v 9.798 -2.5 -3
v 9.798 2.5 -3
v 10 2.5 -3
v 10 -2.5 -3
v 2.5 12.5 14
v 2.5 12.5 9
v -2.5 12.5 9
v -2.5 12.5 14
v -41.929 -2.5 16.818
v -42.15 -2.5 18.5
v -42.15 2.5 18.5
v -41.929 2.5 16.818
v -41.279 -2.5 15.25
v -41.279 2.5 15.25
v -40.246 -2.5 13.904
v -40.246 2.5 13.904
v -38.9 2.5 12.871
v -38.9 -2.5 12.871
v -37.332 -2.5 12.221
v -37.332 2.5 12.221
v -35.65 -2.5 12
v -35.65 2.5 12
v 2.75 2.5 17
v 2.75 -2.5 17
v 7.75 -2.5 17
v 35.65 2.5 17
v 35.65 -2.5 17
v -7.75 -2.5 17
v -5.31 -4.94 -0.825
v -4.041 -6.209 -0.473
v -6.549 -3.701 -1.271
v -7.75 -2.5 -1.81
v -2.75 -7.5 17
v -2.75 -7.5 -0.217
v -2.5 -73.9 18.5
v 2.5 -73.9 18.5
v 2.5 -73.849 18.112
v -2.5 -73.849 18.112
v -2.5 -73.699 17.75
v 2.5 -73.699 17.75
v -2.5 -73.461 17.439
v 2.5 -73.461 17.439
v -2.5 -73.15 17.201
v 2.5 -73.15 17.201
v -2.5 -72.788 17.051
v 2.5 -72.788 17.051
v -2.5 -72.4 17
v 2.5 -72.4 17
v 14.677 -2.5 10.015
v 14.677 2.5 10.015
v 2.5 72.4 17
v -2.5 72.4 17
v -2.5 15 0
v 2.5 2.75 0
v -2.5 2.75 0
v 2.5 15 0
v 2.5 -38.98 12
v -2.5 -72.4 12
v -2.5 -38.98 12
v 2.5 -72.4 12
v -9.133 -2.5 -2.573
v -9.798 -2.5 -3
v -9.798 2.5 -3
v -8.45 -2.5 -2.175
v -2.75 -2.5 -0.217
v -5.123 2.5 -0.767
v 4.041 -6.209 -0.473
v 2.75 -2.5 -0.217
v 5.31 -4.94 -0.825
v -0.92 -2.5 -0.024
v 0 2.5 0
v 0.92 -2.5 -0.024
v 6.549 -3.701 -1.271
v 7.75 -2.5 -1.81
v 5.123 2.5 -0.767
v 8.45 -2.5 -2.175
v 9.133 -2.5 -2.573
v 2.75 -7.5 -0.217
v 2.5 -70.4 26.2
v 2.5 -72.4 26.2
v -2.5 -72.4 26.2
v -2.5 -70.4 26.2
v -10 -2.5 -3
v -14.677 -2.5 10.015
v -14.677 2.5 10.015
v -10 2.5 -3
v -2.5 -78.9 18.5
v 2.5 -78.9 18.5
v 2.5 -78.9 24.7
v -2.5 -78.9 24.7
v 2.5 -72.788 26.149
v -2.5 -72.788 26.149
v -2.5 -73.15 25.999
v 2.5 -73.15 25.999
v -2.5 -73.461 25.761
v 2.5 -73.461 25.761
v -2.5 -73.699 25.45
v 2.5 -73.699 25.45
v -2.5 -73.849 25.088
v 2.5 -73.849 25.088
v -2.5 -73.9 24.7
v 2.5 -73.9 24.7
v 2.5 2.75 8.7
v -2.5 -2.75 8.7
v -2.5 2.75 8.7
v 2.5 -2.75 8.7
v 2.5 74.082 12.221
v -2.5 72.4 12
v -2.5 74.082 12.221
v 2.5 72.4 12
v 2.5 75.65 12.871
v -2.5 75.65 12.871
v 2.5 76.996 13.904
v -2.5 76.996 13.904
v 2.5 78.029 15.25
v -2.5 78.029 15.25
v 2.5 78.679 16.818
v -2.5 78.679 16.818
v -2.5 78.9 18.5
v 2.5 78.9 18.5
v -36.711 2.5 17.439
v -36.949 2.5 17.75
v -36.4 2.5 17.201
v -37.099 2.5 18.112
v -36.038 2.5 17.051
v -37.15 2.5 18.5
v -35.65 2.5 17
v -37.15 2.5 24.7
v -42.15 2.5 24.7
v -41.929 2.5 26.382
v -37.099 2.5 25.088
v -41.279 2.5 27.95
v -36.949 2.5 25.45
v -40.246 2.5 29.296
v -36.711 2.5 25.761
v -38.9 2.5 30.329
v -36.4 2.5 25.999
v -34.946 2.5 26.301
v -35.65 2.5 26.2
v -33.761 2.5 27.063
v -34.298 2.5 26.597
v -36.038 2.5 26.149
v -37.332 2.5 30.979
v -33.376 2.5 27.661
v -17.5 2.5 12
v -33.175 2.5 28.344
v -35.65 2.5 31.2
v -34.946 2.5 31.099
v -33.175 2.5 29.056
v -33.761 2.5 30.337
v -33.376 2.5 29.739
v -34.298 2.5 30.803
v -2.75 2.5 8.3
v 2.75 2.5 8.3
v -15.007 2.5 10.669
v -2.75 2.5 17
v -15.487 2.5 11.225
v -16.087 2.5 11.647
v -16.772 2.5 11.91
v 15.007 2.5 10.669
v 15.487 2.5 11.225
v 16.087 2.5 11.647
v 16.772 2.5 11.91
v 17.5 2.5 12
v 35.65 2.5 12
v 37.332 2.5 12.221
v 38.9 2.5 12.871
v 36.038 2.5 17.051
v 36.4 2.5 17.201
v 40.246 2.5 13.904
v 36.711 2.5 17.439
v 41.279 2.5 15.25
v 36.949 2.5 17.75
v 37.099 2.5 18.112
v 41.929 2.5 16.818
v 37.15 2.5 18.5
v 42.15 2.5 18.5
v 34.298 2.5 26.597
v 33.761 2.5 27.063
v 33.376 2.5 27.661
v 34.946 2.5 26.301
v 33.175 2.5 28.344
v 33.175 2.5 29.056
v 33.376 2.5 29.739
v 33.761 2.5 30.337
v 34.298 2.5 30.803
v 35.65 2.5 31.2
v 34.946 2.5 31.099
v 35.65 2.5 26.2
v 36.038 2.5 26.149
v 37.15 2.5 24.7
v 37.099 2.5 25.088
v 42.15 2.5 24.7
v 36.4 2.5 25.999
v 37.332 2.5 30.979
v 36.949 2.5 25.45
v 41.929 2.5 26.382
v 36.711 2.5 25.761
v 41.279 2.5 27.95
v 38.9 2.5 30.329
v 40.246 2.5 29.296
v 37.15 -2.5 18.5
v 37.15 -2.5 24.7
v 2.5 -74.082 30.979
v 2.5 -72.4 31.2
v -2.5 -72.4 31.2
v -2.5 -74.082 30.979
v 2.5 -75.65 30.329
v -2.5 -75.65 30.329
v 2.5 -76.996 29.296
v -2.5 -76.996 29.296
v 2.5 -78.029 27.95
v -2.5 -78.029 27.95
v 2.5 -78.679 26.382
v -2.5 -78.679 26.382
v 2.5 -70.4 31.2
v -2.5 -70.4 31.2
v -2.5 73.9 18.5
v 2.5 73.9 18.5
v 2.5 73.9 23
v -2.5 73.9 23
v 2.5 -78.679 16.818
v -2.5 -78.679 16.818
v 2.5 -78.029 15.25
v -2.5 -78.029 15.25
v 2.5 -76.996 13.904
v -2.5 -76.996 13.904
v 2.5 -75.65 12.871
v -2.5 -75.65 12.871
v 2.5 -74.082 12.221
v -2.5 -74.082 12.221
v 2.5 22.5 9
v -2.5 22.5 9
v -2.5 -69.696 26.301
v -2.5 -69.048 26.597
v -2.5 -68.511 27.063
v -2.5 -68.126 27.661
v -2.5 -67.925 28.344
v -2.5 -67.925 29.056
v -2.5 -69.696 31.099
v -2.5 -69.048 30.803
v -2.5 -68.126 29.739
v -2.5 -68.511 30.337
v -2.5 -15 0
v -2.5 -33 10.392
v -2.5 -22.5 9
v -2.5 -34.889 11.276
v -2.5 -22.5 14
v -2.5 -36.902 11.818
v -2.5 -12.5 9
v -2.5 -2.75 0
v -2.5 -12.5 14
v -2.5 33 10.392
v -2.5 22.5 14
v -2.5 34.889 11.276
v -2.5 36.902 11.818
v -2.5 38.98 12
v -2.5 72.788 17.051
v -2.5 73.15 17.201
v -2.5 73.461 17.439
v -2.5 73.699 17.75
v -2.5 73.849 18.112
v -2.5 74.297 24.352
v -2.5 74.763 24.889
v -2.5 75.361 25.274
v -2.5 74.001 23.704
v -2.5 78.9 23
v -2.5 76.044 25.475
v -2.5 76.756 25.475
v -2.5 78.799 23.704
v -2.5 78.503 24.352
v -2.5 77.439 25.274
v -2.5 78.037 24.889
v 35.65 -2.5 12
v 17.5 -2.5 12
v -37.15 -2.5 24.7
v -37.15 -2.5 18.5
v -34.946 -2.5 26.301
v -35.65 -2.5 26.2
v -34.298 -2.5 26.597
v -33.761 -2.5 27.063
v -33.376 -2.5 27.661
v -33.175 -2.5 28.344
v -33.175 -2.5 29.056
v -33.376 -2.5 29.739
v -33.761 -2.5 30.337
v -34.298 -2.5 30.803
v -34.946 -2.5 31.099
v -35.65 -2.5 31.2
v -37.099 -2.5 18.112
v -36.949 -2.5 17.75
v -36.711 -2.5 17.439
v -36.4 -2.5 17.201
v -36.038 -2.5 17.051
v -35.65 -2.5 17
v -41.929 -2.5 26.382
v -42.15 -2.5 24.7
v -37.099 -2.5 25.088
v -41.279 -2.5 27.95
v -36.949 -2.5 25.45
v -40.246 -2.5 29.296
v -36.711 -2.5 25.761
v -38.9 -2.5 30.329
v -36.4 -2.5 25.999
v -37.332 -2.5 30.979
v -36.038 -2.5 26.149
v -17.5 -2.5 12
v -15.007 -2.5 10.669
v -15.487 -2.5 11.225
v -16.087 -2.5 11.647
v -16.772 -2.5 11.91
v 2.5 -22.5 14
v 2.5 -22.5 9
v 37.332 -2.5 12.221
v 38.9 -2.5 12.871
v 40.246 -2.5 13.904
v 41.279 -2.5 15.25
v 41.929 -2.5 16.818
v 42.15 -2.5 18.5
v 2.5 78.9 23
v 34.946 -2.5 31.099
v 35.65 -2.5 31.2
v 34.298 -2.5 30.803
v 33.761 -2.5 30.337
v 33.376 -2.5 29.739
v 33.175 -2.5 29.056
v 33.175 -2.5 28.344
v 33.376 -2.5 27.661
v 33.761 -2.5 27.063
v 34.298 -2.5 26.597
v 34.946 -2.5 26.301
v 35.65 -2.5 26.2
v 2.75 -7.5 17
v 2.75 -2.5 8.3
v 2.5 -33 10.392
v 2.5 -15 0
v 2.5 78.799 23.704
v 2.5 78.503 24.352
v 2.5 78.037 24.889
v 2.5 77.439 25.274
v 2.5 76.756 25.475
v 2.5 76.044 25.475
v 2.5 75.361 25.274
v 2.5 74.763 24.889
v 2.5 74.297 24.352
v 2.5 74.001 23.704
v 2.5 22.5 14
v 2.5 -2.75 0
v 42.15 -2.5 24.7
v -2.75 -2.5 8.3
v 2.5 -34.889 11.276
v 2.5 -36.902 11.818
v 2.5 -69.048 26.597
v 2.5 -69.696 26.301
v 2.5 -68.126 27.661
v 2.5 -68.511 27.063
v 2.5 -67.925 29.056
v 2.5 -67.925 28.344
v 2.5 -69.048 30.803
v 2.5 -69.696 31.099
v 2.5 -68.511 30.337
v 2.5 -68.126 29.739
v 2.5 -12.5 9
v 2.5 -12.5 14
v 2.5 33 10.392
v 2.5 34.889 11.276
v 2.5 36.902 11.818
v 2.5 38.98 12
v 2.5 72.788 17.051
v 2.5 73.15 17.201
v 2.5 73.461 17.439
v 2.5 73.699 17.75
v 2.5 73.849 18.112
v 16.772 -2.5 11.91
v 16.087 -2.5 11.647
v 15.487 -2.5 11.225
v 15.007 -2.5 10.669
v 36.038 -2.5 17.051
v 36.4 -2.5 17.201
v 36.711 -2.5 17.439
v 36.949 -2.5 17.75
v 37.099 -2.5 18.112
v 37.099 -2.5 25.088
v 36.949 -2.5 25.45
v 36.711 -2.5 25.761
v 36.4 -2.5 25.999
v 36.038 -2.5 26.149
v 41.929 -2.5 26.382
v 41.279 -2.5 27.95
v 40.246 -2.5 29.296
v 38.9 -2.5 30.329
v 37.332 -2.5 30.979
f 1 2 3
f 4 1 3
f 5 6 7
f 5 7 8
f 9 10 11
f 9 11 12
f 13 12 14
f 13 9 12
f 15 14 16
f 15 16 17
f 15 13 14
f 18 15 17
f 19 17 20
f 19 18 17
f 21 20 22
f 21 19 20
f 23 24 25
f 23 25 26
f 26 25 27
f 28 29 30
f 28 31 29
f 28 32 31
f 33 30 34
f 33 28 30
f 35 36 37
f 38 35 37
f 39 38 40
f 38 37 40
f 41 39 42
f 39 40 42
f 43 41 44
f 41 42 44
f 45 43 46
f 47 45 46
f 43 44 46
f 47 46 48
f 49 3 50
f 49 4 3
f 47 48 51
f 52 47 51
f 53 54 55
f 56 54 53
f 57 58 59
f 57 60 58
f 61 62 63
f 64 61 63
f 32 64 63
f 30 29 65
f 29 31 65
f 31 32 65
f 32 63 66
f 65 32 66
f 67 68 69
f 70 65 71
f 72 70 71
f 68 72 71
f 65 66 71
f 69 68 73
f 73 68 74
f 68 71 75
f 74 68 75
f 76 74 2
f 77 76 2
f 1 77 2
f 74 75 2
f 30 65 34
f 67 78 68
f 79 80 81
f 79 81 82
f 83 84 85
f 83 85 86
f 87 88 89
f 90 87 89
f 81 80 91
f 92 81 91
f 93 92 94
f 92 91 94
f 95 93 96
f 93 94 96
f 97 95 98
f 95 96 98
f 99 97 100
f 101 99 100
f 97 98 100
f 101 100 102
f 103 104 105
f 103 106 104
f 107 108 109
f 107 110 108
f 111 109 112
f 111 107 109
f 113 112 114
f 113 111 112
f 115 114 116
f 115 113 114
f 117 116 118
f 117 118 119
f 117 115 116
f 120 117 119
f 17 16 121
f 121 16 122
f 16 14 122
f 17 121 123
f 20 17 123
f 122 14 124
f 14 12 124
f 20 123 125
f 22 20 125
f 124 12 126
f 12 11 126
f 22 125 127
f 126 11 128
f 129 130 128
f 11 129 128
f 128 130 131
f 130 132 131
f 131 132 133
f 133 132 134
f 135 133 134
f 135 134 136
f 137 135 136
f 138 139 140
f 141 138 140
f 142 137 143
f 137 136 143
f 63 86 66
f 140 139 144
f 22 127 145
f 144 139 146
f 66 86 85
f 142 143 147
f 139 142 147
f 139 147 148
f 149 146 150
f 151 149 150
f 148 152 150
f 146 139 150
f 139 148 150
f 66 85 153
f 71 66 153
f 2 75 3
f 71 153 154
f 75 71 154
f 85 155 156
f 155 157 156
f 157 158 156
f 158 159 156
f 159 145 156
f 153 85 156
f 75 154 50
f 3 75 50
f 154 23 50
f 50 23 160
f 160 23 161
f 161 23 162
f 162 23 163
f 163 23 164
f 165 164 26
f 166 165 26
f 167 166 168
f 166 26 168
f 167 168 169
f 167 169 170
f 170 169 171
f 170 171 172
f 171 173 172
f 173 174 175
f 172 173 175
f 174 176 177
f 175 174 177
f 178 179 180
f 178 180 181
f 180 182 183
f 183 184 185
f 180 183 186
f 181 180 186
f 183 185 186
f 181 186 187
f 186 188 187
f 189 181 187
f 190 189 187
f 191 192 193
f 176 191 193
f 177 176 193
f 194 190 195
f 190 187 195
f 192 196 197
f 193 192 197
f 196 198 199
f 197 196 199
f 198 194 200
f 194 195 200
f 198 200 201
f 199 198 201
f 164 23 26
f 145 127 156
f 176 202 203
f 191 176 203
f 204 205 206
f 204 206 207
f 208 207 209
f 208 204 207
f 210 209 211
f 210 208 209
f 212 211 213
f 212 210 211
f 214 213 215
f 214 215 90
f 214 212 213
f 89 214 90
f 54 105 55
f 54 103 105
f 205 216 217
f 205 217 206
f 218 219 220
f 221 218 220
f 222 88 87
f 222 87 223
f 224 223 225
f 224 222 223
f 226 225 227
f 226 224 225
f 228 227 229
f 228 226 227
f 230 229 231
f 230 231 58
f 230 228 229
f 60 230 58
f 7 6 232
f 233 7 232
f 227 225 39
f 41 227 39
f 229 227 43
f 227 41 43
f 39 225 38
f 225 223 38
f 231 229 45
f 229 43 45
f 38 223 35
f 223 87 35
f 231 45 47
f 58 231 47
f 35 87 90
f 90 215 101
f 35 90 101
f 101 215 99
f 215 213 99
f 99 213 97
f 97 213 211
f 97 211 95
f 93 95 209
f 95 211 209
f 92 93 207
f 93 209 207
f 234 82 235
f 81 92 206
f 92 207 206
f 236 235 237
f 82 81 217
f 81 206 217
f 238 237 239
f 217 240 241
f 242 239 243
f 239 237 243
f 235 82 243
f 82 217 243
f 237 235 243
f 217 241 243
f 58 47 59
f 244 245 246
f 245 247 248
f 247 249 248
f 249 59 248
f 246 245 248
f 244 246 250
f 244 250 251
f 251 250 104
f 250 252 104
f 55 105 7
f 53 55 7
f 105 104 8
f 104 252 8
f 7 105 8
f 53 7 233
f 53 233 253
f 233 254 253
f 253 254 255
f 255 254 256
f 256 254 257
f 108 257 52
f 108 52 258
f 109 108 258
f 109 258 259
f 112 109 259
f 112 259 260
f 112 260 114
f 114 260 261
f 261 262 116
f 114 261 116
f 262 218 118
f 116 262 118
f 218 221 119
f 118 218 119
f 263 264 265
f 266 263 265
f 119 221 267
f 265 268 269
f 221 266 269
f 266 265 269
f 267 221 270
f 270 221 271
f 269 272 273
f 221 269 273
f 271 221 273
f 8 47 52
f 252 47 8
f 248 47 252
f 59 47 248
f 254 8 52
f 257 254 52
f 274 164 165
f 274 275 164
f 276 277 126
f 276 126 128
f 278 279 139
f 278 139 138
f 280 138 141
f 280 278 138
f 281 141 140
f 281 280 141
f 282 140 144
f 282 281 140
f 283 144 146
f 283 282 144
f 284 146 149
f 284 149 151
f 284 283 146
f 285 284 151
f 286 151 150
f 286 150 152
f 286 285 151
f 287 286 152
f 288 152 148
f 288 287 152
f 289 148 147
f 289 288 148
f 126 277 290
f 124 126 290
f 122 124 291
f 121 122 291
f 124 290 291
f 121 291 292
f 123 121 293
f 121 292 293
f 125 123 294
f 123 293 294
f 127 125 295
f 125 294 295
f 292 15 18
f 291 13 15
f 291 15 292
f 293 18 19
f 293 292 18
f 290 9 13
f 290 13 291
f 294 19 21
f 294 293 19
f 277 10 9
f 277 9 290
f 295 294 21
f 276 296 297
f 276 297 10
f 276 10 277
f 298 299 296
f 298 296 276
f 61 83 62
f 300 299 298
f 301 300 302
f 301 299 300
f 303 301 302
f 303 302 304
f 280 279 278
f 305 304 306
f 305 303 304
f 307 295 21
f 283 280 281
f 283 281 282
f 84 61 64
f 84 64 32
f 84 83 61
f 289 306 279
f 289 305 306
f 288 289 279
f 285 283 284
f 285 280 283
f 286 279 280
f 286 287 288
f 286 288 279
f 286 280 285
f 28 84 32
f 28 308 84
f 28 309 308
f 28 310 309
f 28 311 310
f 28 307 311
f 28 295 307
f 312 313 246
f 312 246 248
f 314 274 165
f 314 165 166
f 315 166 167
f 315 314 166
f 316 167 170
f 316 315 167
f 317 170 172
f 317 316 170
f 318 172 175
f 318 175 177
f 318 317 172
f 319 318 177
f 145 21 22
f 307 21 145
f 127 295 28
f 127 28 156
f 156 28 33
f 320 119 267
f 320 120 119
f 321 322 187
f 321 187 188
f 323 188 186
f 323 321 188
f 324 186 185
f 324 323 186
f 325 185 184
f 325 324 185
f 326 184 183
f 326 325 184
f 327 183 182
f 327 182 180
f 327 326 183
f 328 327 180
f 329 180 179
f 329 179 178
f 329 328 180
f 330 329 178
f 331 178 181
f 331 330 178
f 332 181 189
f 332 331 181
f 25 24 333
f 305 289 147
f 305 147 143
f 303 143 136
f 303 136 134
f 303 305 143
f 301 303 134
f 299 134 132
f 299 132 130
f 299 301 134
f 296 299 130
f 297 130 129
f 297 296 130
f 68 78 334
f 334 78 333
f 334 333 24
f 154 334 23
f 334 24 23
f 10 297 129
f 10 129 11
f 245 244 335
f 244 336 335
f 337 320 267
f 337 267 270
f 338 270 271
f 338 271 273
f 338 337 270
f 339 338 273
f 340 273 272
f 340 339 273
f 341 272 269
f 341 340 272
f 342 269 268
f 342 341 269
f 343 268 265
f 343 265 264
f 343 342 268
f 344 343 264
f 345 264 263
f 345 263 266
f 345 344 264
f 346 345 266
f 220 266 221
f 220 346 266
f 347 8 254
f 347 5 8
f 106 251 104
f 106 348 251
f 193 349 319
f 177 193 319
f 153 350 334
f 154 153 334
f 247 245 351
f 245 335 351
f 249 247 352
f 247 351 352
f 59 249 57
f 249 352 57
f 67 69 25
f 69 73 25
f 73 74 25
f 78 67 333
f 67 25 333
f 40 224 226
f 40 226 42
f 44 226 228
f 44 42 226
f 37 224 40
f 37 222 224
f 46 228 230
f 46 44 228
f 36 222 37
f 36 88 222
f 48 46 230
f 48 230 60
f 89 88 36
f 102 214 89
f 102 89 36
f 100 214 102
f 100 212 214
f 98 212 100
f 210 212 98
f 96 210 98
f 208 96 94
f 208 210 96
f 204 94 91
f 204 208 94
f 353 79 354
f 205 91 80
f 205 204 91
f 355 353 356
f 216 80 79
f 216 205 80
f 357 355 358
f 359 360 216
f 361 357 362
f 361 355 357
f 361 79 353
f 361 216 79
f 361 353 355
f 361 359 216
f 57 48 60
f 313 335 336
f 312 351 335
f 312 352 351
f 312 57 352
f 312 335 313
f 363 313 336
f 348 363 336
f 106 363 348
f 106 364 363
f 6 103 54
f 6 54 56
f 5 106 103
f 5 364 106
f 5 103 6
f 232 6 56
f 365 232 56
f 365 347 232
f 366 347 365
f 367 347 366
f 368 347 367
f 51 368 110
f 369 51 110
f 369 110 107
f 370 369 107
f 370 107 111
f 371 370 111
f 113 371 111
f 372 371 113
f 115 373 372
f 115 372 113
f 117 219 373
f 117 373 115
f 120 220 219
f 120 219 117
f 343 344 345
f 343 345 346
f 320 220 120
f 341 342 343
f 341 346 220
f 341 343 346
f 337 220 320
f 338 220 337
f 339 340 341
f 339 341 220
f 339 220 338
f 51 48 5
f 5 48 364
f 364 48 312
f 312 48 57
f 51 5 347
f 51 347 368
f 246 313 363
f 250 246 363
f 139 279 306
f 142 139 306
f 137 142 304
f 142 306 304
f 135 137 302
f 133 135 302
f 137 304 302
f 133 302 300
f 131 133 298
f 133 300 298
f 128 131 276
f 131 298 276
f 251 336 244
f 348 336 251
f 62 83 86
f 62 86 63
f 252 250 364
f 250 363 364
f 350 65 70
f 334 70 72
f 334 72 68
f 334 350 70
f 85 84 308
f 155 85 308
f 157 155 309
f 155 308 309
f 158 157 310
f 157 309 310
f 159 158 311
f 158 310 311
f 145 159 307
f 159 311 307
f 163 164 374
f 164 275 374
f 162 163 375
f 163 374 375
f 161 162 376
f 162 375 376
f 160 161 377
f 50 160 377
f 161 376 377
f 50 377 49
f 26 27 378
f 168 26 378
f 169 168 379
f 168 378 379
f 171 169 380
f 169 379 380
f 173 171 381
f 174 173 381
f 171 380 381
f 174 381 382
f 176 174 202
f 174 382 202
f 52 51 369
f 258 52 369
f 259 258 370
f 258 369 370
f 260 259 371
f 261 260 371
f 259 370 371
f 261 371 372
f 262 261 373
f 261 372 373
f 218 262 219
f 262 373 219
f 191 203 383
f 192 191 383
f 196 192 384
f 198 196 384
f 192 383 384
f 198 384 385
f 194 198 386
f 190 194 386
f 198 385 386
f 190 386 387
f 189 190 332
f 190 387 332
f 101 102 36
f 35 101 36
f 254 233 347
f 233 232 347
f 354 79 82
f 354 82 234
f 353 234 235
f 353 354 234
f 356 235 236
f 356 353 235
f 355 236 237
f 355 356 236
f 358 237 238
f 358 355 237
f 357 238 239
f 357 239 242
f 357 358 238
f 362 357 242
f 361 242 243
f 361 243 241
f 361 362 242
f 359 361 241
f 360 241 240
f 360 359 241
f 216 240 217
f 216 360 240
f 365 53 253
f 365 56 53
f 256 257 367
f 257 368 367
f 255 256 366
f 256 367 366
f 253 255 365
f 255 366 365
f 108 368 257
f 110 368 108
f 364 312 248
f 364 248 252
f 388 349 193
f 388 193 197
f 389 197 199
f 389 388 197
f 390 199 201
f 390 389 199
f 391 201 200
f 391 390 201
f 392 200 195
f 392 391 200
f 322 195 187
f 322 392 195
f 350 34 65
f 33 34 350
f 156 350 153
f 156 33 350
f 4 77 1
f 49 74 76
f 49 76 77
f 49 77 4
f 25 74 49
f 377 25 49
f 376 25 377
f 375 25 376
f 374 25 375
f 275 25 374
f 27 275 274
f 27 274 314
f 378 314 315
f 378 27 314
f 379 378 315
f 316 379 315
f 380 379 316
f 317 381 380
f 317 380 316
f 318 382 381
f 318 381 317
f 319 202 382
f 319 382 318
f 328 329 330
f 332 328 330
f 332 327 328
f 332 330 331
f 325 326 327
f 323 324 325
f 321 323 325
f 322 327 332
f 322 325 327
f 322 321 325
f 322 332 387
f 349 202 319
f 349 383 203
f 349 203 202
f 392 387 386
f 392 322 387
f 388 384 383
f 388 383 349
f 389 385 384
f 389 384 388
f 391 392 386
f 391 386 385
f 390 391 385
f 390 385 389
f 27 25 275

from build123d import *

# Parameters (mm, degrees)
SKETCH_W     = 10
SKETCH_H     = 5
PAD_DEPTH    = 2.5
PAD001_DEPTH = 2.5
PAD002_DEPTH = 20
POCKET_DEPTH = 10


with BuildPart() as vertical:
    # Sketch → Pad (new body, symmetric)
    with BuildSketch(Plane.YZ):
        with BuildLine():
            Line((78.9, 18.499999), (78.9, 22.999996))
            ThreePointArc((78.9, 22.999996), (76.400002, 25.499995), (73.9, 23))
            Line((73.9, 18.499991), (73.9, 23))
            ThreePointArc((72.4, 17), (73.460657, 17.439337), (73.9, 18.499991))
            Line((-72.4, 17), (72.4, 17))
            ThreePointArc((-73.9, 18.499991), (-73.460657, 17.439336), (-72.4, 17))
            Line((-73.9, 24.700009), (-73.9, 18.499991))
            ThreePointArc((-72.4, 26.2), (-73.460657, 25.760664), (-73.9, 24.700009))
            Line((-72.4, 26.2), (-70.4, 26.2))
            ThreePointArc((-70.4, 26.2), (-67.9, 28.7), (-70.4, 31.2))
            Line((-70.4, 31.2), (-72.400018, 31.2))
            ThreePointArc((-72.400018, 31.2), (-76.996199, 29.296189), (-78.9, 24.700004))
            Line((-78.9, 18.499991), (-78.9, 24.700004))
            ThreePointArc((-78.9, 18.499991), (-76.996183, 13.903795), (-72.399977, 12))
            Line((-72.399977, 12), (-38.979663, 12))
            ThreePointArc((-33, 10.392302), (-35.883655, 11.591063), (-38.979663, 12))
            Line((-15, 0), (-33, 10.392302))
            Line((-15, 0), (-2.75, 0))
            Line((-2.75, 0), (-2.75, 8.7))
            Line((-2.75, 8.7), (2.75, 8.7))
            Line((2.75, 8.7), (2.75, 0))
            Line((2.75, 0), (15, 0))
            Line((15, 0), (33, 10.392302))
            ThreePointArc((38.979663, 12), (35.883655, 11.591063), (33, 10.392302))
            Line((38.979663, 12), (72.4, 12))
            ThreePointArc((72.4, 12), (76.996194, 13.903806), (78.9, 18.499999))
        make_face()
        with Locations((-17.5, 11.5)):
            Rectangle(SKETCH_W, SKETCH_H, mode=Mode.SUBTRACT)
        with Locations((17.5, 11.5)):
            Rectangle(SKETCH_W, SKETCH_H, mode=Mode.SUBTRACT)
    extrude(amount=PAD_DEPTH, both=True)


with BuildPart() as fusion:
    # Sketch001 → Pad001 (new body, symmetric)
    with BuildSketch(Plane.XZ):
        with BuildLine():
            Line((17.5, 12.000015), (35.649994, 12))
            ThreePointArc((35.649994, 12), (40.246192, 13.903804), (42.15, 18.500001))
            Line((42.15, 24.700029), (42.15, 18.500001))
            ThreePointArc((42.15, 24.700029), (40.246194, 29.296224), (35.649999, 31.20003))
            ThreePointArc((35.649999, 31.20003), (33.149999, 28.70003), (35.649999, 26.20003))
            ThreePointArc((37.15, 24.700029), (36.71066, 25.76069), (35.649999, 26.20003))
            Line((37.15, 18.500001), (37.15, 24.700029))
            ThreePointArc((35.649999, 17), (36.71066, 17.43934), (37.15, 18.500001))
            Line((2.75, 17), (35.649999, 17))
            Line((2.75, 8.3), (2.75, 17))
            Line((-2.75, 8.3), (2.75, 8.3))
            Line((-2.75, 17.000015), (-2.75, 8.3))
            Line((-35.65, 17.000015), (-2.75, 17.000015))
            ThreePointArc((-37.15, 18.500001), (-36.710655, 17.43935), (-35.65, 17.000015))
            Line((-37.15, 18.500001), (-37.15, 24.700029))
            ThreePointArc((-35.649999, 26.200015), (-36.710655, 25.76068), (-37.15, 24.700029))
            ThreePointArc((-35.649999, 26.200015), (-33.149999, 28.700015), (-35.649999, 31.200015))
            ThreePointArc((-35.649999, 31.200015), (-40.246189, 29.296214), (-42.15, 24.700029))
            Line((-42.15, 24.700029), (-42.15, 18.500001))
            ThreePointArc((-42.15, 18.500001), (-40.246189, 13.903816), (-35.649999, 12.000015))
            Line((-35.649999, 12.000015), (-17.5, 12.000015))
            ThreePointArc((-14.676752, 10.014544), (-15.774252, 11.453949), (-17.5, 12.000015))
            Line((-14.676752, 10.014544), (-10, -3))
            Line((-10, -3), (10, -3))
            Line((10, -3), (14.676749, 10.014543))
            ThreePointArc((17.5, 12.000015), (15.77425, 11.45395), (14.676749, 10.014543))
        make_face()
    extrude(amount=PAD001_DEPTH, both=True)

    # Sketch002 → Pad002 (new body)
    with BuildSketch(Plane(origin=(0, 0, 17.000015), x_dir=(-1, 0, 0), z_dir=(0, 0, 1))):
        Polygon((-7.75, 2.5), (-2.75, 7.5), (-2.75, 2.5), align=None)
        Polygon((2.75, 7.5), (2.75, 2.5), (7.75, 2.5), align=None)
    extrude(amount=-PAD002_DEPTH)

    # Sketch003 → Pocket (cut)
    with BuildSketch(Plane(origin=(0, 2.5, 0), x_dir=(1, 0, 0), z_dir=(0, 1, 0))):
        with BuildLine():
            ThreePointArc((-10, 3.138593), (0, 0), (10, 3.138593))
            Line((-10, 3.138593), (10, 3.138593))
        make_face()
    extrude(amount=-POCKET_DEPTH, mode=Mode.SUBTRACT)

    # Fusion: union Vertical
    add(vertical.part)


solid = fusion.part
